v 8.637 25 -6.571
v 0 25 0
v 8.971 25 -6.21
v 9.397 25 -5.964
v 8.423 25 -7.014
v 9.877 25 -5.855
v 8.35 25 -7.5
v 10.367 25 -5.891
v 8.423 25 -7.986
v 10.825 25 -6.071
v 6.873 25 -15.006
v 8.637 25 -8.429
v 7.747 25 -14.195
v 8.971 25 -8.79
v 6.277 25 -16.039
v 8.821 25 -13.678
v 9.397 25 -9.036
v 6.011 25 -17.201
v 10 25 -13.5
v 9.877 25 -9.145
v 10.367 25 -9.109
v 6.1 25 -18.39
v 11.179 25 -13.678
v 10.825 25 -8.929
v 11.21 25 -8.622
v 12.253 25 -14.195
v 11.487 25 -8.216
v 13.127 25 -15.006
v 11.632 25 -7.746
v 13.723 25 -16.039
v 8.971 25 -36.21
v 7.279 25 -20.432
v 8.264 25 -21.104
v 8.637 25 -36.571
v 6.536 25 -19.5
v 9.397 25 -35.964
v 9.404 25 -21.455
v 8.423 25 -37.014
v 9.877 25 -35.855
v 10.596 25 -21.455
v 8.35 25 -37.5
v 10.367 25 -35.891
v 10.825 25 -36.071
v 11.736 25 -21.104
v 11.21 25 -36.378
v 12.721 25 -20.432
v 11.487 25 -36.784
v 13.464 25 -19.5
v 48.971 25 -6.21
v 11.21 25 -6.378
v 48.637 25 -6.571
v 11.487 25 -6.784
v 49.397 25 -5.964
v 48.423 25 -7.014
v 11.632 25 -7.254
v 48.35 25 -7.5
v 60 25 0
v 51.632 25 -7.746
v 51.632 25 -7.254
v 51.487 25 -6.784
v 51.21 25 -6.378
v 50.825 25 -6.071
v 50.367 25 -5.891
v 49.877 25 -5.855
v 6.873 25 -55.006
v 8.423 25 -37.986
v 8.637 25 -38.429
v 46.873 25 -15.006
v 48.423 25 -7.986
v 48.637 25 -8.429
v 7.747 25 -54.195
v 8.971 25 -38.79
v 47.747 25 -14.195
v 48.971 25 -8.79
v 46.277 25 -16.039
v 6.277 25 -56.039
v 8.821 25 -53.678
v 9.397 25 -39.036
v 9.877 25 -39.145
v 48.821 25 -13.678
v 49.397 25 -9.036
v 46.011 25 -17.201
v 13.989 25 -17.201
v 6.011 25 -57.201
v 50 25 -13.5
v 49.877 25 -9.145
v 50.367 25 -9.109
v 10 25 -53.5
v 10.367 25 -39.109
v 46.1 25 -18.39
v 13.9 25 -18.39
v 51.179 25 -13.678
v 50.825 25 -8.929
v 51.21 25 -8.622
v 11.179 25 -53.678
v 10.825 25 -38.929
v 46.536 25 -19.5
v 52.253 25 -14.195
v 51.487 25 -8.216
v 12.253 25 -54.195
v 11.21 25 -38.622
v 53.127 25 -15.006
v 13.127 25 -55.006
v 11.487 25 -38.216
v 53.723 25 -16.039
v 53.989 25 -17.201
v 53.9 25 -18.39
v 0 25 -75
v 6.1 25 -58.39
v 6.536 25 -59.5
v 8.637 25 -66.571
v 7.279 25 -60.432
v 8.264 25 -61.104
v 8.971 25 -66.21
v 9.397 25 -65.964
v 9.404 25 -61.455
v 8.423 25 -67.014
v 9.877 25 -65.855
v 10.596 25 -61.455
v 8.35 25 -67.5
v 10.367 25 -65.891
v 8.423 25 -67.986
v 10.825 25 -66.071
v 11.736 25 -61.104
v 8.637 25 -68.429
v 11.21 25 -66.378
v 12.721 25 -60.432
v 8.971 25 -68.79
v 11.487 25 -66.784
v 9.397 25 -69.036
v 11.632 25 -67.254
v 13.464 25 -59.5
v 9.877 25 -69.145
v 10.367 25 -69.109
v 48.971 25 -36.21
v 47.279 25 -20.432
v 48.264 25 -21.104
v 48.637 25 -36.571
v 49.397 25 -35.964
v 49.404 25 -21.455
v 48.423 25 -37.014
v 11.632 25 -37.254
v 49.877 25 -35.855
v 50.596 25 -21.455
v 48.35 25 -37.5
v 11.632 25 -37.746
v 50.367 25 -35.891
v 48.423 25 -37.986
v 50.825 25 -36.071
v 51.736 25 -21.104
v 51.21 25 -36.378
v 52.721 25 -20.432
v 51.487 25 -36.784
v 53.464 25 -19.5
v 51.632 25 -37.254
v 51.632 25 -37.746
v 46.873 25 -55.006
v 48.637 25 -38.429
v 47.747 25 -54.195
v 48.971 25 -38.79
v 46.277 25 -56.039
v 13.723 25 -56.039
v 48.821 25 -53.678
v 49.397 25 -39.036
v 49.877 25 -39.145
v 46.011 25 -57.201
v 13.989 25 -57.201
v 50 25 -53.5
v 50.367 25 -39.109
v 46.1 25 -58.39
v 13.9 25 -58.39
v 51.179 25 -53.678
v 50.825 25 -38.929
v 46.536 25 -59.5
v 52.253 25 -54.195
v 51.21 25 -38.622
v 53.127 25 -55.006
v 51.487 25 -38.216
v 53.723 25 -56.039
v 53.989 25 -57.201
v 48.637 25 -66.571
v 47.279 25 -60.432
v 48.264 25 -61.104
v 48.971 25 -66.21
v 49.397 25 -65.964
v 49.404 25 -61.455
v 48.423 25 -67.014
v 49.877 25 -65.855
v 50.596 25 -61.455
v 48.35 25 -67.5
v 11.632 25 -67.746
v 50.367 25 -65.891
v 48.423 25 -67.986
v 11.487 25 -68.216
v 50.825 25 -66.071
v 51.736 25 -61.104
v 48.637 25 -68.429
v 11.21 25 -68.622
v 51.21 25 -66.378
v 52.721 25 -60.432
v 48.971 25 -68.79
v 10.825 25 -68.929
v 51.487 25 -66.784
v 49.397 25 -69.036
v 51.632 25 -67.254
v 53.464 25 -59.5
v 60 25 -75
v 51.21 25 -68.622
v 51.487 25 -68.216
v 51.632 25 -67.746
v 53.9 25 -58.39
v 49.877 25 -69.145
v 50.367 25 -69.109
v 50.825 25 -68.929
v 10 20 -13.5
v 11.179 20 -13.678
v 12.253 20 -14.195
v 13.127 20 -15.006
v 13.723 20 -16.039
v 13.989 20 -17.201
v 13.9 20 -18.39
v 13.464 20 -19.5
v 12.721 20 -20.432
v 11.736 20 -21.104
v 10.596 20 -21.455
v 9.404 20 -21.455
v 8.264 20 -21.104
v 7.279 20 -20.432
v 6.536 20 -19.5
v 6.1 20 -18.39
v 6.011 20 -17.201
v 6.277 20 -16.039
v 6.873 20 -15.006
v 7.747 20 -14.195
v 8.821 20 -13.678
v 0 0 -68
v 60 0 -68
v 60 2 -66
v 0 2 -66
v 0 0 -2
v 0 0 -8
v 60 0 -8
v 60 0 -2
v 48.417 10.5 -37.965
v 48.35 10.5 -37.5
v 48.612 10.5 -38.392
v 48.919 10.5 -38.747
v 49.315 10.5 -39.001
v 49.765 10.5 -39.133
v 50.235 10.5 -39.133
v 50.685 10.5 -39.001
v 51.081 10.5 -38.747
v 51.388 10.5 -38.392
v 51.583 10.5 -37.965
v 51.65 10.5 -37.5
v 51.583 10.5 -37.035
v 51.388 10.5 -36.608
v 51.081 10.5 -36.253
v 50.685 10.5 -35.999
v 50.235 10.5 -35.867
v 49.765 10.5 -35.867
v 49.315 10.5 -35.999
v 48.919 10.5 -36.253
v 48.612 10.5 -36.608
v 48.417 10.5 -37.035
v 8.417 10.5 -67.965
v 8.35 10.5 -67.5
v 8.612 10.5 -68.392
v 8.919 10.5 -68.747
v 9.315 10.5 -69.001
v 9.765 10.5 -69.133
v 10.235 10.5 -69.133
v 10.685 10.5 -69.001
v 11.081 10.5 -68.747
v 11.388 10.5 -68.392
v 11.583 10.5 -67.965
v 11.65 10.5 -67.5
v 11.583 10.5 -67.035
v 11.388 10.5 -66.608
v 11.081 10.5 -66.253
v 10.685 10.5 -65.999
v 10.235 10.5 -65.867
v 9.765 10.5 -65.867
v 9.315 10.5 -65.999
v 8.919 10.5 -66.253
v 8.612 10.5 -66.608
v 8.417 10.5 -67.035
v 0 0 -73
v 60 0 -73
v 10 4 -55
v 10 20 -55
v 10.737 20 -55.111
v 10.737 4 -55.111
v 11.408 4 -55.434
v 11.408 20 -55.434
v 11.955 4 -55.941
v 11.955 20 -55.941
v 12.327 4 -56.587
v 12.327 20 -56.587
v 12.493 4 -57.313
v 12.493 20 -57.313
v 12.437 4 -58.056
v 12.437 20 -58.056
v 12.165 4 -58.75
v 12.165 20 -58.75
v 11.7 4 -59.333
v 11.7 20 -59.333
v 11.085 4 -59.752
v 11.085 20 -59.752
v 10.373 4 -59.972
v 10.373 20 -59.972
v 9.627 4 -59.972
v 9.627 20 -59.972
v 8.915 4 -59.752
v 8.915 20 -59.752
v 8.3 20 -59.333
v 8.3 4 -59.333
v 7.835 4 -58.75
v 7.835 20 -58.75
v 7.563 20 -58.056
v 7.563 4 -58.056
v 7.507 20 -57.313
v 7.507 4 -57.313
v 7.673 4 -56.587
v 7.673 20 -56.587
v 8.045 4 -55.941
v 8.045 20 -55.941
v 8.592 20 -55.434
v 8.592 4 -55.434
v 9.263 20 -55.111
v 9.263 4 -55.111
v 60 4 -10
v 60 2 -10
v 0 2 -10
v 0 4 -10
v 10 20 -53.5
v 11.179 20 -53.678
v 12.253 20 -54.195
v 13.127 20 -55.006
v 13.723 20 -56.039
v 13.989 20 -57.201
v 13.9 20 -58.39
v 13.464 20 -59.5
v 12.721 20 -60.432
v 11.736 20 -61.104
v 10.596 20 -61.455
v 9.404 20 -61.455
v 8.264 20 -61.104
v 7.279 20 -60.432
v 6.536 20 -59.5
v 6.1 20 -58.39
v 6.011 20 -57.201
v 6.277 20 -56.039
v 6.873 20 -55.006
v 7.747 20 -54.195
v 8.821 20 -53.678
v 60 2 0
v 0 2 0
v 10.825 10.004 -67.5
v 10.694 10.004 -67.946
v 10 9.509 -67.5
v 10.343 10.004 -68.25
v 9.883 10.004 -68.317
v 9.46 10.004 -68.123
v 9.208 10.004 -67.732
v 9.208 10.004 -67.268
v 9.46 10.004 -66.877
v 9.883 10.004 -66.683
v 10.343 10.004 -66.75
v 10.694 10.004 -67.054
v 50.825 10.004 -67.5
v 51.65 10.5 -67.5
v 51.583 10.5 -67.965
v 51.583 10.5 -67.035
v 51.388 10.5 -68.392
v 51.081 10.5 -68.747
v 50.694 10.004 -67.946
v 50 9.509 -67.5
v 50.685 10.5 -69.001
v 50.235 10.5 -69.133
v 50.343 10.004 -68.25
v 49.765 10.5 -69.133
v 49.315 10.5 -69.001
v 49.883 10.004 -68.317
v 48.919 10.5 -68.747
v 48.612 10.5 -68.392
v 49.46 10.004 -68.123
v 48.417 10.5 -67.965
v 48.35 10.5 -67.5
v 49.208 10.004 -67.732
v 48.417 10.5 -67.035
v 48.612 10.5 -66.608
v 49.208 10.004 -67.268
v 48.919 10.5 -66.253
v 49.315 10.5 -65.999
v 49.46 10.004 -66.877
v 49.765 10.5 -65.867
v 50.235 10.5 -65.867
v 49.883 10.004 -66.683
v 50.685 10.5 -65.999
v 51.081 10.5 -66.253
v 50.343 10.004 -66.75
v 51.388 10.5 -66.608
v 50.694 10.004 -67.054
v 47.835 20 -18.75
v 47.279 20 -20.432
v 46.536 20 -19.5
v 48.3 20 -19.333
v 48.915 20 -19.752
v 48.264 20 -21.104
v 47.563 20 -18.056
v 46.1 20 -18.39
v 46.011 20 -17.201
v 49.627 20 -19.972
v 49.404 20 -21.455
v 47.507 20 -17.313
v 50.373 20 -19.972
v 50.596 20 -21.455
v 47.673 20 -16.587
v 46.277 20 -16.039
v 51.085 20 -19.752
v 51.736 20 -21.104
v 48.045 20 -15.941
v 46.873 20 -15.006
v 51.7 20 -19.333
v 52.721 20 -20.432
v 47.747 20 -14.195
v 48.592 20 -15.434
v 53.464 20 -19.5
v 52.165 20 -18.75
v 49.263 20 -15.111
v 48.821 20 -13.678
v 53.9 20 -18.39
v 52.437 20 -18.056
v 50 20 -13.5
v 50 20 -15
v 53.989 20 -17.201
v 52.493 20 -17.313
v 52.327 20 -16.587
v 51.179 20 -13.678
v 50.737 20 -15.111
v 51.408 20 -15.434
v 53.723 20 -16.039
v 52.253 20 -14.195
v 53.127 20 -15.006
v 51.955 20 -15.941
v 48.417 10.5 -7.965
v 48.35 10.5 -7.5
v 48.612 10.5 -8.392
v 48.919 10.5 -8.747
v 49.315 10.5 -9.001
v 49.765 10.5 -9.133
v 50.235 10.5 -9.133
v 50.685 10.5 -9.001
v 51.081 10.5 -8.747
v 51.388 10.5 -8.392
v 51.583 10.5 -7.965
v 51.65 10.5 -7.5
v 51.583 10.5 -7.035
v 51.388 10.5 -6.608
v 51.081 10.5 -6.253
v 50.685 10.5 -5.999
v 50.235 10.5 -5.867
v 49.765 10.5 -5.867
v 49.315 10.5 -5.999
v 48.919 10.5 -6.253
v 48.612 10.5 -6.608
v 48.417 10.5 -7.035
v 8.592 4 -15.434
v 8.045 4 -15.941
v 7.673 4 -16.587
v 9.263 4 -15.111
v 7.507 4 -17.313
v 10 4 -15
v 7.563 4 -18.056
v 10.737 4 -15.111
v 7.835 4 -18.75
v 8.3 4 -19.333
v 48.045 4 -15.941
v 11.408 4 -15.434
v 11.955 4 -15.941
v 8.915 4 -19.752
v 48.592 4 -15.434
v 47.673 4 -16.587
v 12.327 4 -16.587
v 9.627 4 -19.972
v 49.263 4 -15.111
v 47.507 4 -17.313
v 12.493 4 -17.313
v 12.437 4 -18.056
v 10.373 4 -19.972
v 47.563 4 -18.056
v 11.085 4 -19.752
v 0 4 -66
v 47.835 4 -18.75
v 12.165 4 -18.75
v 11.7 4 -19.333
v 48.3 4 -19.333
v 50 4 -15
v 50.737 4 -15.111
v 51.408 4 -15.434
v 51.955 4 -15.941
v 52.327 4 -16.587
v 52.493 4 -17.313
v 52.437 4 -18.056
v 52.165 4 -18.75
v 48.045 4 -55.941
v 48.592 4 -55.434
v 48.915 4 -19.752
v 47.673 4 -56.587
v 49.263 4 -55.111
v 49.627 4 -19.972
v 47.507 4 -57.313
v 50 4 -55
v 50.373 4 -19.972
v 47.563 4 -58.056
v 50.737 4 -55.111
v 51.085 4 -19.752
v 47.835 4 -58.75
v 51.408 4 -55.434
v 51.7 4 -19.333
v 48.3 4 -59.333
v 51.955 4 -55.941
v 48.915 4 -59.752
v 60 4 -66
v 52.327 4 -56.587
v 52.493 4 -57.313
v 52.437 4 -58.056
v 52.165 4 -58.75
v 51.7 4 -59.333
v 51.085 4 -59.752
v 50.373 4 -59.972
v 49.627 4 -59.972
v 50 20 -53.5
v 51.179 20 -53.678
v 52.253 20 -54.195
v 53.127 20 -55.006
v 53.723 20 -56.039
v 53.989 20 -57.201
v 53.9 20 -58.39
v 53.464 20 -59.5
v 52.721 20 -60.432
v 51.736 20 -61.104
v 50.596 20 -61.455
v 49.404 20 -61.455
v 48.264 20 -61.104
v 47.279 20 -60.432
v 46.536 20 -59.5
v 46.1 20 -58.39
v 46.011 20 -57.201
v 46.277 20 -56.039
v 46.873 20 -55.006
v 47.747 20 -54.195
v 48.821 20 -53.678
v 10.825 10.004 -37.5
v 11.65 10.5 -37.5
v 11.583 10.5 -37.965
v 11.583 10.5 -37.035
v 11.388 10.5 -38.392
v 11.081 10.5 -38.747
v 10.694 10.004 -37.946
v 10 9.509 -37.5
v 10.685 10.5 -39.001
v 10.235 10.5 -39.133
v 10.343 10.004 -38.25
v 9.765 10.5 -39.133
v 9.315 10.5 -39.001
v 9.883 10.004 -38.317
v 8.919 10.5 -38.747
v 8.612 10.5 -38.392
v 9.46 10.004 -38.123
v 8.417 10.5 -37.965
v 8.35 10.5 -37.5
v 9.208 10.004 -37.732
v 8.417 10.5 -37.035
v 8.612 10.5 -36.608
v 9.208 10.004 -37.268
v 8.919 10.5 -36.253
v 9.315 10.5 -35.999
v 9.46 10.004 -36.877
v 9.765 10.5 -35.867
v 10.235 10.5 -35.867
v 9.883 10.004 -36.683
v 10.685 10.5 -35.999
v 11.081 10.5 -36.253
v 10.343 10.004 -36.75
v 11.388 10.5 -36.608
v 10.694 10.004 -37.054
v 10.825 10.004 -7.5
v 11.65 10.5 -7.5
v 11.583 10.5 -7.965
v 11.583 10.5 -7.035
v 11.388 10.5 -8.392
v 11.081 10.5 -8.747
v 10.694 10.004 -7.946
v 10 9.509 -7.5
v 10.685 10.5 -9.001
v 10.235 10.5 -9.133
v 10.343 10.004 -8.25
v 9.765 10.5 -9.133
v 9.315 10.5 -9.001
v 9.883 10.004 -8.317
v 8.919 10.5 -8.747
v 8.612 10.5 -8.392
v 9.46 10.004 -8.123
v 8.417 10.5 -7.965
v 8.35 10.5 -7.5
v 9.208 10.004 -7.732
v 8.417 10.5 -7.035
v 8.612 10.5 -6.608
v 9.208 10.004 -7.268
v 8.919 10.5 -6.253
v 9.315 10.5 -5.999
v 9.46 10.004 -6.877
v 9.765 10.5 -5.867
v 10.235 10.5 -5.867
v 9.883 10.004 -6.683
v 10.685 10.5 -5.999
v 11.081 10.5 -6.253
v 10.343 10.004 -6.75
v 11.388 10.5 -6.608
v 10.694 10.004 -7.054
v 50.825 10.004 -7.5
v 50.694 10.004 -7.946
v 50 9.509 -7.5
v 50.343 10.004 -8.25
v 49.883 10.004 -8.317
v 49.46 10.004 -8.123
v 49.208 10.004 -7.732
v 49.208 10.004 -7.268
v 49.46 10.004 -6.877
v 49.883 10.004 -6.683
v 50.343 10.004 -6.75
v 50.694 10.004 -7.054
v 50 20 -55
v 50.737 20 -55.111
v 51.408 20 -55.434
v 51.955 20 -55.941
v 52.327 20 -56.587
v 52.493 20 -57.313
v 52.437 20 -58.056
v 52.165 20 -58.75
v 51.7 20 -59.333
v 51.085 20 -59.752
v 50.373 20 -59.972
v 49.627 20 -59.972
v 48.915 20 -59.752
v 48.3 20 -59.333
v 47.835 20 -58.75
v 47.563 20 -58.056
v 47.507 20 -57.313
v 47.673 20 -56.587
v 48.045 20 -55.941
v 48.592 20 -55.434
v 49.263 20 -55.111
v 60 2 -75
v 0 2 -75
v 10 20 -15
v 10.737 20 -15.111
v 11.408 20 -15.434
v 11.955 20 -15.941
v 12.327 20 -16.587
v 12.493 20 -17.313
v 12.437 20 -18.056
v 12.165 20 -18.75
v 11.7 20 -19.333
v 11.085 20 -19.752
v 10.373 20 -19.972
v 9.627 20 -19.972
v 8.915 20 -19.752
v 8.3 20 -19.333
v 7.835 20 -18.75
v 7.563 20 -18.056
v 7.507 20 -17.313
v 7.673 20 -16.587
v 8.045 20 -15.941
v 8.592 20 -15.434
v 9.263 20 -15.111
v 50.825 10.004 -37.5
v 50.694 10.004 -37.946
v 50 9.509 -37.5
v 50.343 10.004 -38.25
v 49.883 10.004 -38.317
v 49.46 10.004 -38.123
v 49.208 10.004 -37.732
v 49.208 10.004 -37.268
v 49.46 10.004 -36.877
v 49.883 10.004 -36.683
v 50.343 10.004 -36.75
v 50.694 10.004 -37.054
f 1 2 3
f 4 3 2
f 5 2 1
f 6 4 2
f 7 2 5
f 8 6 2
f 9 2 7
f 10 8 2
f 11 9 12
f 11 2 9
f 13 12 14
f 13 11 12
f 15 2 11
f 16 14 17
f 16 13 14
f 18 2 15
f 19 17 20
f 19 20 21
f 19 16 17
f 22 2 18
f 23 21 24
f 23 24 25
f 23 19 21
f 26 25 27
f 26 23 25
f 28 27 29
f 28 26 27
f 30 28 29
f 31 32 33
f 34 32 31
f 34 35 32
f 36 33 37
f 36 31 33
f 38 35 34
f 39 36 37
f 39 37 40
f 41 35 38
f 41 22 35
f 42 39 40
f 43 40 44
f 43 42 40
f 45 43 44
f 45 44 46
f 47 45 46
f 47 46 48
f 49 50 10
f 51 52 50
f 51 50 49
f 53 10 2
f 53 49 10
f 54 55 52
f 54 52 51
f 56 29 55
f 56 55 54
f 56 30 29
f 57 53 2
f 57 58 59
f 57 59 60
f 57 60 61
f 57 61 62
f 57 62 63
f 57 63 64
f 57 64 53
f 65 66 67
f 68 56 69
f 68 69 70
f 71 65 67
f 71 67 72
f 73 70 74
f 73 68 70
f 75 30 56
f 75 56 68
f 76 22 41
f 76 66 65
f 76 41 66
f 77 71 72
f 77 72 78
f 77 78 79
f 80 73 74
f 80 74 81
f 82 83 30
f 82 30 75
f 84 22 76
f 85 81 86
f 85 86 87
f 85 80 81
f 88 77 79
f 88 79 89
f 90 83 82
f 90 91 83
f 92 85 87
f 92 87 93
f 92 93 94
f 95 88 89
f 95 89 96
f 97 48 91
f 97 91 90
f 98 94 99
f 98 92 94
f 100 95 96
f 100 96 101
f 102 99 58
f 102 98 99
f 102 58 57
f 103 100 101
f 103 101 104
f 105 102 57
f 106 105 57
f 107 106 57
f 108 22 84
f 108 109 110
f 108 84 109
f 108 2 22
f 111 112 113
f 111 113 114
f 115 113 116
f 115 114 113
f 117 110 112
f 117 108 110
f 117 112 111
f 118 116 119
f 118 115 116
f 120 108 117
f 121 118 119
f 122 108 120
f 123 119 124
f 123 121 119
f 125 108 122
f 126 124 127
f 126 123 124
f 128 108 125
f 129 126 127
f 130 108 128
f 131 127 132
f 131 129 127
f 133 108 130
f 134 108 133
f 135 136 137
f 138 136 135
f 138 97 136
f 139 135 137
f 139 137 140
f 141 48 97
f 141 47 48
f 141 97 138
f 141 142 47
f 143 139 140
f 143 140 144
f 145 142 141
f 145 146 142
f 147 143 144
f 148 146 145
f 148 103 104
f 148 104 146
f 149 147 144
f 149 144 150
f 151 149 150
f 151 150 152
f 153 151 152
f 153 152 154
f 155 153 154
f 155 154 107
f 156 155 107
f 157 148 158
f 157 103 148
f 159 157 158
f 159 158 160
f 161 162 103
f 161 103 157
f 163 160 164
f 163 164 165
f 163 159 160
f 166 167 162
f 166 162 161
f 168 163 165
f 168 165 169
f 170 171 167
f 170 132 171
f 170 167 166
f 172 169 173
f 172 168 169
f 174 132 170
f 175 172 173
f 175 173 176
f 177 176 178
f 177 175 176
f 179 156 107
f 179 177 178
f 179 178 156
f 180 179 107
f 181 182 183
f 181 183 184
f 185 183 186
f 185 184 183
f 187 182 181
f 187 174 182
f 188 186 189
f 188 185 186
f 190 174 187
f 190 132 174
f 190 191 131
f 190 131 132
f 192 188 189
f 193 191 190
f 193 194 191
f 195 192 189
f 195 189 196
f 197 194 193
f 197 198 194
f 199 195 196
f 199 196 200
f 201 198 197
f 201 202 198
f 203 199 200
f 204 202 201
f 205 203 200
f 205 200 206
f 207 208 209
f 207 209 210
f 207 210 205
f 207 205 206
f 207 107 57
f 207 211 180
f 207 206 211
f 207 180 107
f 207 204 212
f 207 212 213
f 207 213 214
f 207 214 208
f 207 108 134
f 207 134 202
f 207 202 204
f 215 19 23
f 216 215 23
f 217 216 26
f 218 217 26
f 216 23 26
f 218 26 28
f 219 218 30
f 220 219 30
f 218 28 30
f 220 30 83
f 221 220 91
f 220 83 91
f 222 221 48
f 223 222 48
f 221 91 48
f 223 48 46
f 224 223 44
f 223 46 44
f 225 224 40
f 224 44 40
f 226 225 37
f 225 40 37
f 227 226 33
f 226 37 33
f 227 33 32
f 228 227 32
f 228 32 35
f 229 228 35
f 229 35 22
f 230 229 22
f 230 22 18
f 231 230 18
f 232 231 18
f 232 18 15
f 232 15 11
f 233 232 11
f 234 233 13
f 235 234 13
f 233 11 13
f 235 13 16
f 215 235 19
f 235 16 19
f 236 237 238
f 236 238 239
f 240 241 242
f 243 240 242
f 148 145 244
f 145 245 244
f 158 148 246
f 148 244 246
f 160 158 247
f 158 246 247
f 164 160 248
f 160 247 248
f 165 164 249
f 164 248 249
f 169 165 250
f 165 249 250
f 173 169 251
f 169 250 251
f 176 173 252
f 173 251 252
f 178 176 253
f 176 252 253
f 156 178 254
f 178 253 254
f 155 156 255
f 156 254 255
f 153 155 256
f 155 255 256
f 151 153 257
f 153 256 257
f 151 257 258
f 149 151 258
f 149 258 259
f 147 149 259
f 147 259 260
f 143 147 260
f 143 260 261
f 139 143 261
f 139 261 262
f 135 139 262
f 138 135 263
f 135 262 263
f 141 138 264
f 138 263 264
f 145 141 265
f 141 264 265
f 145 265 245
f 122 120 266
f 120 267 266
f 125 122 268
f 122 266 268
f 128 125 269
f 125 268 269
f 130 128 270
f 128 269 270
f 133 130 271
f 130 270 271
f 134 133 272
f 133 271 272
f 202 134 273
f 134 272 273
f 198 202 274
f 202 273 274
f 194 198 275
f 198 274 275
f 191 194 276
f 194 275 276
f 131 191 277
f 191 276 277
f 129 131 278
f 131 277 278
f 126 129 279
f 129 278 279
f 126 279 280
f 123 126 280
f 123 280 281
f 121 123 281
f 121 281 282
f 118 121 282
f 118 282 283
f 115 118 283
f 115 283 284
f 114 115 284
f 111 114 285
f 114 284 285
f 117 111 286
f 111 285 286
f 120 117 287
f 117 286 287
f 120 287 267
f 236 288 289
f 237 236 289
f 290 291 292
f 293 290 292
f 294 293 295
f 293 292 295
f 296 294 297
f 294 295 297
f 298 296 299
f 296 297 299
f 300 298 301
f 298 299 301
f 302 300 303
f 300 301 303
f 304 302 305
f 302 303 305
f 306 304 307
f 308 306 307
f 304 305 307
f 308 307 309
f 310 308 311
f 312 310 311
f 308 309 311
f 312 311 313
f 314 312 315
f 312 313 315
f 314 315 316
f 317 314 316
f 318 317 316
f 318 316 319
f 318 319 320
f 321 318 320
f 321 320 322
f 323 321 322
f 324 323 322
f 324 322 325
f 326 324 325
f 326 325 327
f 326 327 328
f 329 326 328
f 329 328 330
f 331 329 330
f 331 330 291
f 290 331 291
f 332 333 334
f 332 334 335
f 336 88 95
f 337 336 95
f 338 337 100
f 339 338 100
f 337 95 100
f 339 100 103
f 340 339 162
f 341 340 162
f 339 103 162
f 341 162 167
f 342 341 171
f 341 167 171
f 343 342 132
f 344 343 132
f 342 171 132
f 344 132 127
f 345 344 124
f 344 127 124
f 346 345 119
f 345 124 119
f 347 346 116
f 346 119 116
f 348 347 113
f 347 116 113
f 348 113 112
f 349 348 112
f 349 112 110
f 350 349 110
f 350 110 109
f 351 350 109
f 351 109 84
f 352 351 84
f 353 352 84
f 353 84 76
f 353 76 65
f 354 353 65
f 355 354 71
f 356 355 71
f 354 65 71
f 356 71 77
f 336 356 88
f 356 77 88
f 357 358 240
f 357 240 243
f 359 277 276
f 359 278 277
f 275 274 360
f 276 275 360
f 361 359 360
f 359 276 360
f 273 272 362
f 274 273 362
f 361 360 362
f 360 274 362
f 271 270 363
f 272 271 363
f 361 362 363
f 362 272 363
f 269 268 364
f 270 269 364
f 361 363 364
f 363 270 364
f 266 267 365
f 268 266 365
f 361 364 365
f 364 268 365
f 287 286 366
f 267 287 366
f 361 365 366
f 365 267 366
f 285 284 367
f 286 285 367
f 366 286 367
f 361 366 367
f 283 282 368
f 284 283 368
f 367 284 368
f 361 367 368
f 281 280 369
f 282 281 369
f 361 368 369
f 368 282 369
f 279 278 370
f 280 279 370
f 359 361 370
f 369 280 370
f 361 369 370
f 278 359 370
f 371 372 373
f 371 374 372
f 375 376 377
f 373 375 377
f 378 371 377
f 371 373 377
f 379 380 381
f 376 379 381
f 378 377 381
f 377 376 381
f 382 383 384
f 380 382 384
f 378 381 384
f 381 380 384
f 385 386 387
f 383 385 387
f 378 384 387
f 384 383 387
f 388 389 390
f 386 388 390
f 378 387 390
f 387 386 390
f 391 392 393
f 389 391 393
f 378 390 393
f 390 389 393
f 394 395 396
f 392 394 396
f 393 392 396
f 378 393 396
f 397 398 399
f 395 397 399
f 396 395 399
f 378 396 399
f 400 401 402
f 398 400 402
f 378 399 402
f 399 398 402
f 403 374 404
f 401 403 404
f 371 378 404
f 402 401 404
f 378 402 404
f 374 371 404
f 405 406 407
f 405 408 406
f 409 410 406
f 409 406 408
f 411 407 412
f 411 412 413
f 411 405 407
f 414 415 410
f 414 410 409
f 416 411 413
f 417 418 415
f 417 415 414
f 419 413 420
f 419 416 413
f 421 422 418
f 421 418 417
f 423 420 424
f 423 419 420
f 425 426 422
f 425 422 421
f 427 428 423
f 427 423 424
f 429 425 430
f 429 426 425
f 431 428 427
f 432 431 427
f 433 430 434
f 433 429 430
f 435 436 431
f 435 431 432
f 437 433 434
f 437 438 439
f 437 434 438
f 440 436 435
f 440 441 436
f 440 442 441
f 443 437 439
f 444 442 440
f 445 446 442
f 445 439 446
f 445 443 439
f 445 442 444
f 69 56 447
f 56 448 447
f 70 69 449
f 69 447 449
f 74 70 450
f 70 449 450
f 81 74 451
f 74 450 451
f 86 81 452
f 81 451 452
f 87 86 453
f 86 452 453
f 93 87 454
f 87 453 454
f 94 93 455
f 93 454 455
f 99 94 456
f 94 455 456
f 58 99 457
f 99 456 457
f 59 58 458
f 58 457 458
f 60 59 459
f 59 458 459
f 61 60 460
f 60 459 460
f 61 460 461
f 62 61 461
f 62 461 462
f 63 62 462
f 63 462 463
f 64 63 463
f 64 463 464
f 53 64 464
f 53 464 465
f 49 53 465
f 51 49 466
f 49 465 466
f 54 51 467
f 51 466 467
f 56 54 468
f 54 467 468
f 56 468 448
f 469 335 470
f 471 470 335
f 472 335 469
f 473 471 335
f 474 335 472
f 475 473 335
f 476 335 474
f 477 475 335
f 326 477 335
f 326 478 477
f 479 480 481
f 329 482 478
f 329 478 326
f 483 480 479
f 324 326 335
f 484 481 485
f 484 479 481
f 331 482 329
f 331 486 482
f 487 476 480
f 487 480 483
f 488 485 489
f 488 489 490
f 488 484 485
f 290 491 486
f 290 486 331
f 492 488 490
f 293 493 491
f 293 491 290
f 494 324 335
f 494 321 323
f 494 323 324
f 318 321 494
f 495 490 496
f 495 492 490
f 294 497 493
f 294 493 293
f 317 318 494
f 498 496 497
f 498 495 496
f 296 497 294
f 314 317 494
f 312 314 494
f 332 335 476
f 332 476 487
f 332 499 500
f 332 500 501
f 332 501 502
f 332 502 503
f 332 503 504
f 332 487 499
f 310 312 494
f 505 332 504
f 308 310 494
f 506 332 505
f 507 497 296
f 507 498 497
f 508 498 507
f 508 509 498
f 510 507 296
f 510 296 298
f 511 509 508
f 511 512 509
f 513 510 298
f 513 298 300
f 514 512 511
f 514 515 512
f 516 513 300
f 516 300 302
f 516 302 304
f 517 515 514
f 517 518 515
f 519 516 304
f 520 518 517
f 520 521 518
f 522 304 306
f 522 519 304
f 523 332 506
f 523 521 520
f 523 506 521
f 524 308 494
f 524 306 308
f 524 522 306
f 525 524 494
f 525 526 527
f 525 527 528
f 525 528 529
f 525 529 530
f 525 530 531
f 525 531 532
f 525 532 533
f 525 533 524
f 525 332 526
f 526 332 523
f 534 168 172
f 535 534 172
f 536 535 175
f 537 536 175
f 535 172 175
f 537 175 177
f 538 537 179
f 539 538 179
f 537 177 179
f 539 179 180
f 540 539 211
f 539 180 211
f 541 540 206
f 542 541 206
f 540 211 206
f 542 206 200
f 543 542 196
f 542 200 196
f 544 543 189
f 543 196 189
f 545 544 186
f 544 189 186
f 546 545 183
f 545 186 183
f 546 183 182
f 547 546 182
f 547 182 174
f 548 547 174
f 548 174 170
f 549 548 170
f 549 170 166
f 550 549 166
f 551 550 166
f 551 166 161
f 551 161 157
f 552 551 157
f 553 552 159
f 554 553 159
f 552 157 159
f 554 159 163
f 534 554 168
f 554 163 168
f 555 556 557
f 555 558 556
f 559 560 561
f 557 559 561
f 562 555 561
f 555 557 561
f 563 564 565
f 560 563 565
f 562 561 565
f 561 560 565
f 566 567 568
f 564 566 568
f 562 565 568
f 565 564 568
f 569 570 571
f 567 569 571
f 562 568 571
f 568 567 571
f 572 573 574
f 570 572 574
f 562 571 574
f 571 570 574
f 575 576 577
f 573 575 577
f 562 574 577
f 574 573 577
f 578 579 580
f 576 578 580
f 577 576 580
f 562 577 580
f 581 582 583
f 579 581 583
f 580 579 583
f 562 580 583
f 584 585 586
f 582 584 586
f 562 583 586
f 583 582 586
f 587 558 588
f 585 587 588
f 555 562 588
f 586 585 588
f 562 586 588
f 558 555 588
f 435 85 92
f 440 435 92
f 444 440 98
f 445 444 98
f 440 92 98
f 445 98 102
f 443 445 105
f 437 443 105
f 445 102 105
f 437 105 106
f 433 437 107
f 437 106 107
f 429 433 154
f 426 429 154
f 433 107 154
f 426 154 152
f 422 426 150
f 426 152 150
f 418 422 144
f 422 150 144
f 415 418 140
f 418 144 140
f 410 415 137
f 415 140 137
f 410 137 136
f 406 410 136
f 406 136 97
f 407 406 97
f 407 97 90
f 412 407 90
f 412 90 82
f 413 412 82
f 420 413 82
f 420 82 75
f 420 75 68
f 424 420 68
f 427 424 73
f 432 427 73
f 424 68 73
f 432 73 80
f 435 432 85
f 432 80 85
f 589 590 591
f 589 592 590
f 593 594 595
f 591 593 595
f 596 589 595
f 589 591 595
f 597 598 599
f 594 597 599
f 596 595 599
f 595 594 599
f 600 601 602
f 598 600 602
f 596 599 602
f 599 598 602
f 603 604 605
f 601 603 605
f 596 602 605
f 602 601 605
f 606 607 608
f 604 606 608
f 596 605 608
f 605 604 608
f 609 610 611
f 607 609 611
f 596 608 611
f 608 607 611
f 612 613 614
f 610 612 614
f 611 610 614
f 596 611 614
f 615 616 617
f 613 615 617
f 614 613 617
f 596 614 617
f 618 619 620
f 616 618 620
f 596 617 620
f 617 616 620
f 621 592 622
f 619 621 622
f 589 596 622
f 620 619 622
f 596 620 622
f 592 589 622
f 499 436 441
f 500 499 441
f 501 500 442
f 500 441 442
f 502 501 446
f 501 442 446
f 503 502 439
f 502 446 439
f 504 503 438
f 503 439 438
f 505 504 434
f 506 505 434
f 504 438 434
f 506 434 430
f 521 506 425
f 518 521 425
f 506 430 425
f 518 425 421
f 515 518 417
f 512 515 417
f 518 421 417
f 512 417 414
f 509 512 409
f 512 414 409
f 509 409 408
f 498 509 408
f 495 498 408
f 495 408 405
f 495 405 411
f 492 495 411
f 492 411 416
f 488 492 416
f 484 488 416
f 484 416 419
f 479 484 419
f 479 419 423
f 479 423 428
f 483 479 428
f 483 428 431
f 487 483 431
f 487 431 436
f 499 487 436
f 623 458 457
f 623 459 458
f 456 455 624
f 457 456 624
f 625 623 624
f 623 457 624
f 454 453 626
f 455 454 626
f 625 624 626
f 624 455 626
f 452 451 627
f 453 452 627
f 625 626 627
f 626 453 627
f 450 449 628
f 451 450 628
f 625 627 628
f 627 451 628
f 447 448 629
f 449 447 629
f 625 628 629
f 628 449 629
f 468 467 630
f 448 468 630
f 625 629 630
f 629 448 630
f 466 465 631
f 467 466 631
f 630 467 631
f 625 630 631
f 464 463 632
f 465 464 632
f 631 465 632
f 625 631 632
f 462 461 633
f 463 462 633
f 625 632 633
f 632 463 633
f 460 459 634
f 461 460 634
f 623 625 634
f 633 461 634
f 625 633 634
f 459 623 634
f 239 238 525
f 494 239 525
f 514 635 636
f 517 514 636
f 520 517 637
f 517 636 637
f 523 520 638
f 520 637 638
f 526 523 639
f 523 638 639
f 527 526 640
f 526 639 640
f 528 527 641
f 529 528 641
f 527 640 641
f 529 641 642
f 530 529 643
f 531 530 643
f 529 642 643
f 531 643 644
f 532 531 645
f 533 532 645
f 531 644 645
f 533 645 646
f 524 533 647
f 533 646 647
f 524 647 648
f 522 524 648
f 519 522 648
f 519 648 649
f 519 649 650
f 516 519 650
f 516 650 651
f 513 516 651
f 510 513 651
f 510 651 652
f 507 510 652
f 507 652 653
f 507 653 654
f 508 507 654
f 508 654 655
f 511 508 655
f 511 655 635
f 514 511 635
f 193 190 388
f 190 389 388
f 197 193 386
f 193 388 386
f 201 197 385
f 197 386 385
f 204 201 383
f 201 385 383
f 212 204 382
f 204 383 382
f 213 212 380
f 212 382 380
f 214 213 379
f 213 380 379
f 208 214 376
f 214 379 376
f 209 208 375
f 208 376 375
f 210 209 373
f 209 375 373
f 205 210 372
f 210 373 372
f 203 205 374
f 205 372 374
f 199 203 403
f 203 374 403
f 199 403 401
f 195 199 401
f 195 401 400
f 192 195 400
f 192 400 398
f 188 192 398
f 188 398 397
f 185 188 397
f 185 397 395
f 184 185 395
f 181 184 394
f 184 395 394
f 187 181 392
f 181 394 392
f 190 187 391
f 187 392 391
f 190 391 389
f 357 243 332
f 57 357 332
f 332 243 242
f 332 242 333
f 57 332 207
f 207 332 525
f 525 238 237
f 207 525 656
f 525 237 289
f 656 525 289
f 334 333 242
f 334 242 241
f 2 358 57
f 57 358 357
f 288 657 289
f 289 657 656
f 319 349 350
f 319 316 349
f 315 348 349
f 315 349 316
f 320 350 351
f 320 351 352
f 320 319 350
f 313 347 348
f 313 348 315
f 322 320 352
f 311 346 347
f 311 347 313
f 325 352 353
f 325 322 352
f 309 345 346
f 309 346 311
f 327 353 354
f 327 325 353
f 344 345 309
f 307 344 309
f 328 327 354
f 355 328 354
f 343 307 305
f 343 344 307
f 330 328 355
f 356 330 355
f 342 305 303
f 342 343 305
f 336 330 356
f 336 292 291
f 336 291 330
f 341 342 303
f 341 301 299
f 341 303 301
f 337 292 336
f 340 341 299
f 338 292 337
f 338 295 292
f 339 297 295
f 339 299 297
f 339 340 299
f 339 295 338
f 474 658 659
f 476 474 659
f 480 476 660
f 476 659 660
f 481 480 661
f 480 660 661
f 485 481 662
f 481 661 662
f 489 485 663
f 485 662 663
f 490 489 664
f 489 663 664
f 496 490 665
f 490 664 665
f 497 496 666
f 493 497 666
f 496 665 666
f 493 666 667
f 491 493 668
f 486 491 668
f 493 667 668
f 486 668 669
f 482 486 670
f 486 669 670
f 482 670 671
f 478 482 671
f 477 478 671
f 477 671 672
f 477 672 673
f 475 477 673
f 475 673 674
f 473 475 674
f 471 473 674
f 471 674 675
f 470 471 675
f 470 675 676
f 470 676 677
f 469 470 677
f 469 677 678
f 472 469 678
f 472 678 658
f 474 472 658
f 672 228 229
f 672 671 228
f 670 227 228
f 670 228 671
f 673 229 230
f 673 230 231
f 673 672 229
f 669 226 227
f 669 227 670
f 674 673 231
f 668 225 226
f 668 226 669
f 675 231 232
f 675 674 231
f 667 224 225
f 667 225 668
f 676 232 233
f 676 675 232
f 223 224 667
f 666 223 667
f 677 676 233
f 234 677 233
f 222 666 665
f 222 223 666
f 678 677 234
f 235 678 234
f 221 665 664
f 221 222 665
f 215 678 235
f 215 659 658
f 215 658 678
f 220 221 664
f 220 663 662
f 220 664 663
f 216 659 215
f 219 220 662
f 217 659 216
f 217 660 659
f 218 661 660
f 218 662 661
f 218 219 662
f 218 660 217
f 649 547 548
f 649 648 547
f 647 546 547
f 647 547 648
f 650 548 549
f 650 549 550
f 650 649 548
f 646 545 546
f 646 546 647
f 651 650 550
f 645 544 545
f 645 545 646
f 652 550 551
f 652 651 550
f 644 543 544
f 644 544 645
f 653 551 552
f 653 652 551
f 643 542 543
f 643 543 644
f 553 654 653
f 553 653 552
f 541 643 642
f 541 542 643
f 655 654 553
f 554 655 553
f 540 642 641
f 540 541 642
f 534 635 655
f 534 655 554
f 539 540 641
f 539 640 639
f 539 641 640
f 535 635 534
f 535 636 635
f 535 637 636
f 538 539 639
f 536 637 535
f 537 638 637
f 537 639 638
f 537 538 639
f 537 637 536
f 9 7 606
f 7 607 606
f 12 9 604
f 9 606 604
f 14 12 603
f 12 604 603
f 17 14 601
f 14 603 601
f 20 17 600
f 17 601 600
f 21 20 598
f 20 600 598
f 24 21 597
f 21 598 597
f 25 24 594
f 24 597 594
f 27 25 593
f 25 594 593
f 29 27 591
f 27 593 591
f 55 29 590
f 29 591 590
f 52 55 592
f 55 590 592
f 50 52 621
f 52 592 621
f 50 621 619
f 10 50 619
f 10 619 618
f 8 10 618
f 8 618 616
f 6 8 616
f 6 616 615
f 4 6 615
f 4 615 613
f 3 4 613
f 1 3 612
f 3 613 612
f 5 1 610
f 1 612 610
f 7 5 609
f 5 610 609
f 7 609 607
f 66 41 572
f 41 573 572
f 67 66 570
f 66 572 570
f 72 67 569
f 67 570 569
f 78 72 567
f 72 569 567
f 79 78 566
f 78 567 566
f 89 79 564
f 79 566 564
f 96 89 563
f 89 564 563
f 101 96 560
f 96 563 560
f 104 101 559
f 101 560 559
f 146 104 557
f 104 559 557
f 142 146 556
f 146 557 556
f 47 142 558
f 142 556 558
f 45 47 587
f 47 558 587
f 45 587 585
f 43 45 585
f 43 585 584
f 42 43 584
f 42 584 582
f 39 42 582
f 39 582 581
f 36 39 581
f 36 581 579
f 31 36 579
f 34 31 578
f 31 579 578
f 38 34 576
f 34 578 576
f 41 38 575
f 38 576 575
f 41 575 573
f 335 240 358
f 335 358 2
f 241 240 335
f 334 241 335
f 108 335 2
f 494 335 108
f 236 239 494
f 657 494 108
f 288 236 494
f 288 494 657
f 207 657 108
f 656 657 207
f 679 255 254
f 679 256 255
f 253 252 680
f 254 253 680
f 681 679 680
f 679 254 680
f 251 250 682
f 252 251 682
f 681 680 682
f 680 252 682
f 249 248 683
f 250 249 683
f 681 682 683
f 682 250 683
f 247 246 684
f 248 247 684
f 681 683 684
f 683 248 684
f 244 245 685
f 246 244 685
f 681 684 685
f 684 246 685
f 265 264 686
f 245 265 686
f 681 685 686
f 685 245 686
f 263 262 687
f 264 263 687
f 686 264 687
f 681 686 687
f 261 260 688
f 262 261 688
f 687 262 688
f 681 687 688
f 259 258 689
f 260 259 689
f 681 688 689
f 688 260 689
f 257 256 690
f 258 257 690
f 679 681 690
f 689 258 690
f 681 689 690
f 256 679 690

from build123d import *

# Parameters (mm, degrees)
SKETCH_1_W             = 60
SKETCH_1_H             = 75
EXTRUDE_1_DEPTH        = 25
SKETCH_2_W             = 56
SKETCH_2_H             = 4
CUT_EXTRUDE_1_DEPTH    = 100.247166206
CHAMFER_1_SIZE         = 2
SKETCH_3_R             = 4
CUT_EXTRUDE_2_DEPTH    = 5
SKETCH_4_R             = 2.5
CUT_EXTRUDE_3_DEPTH    = 99.107084352
HOLE_WIZARD_M4_1_D     = 3.3
HOLE_WIZARD_M4_1_DEPTH = 14.5
HOLE_WIZARD_M4_1_TIP   = 0.991420021


with BuildPart() as part:
    # 스케치1 → 보스-돌출1 (new body)
    with BuildSketch(Plane(origin=(0, 0, 0), x_dir=(1, 0, 0), z_dir=(0, 1, 0))):
        with Locations((30, 37.5)):
            Rectangle(SKETCH_1_W, SKETCH_1_H)
    extrude(amount=EXTRUDE_1_DEPTH)

    # 스케치2 → 컷-돌출1 (cut, through all)
    with BuildSketch(Plane(origin=(60, 0, 0), x_dir=(0, 0, -1), z_dir=(1, 0, 0))):
        with Locations((38, 2)):
            Rectangle(SKETCH_2_W, SKETCH_2_H)
    extrude(amount=-CUT_EXTRUDE_1_DEPTH, mode=Mode.SUBTRACT)

    # 모따기1
    chamfer_1_edges = [part.edges().sort_by_distance(p)[0] for p in [
        (30, 0, -10),
        (30, 0, -66),
        (30, 0, -75),
        (30, 0, 0),
    ]]
    chamfer(chamfer_1_edges, length=CHAMFER_1_SIZE)

    # 스케치3 → 컷-돌출2 (cut)
    with BuildSketch(Plane(origin=(0, 25, 0), x_dir=(1, 0, 0), z_dir=(0, 1, 0))):
        with Locations(Location((10, 57.5, 0), (0, 0, 270))):
            Circle(SKETCH_3_R)
        with Locations(Location((10, 17.5, 0), (0, 0, 270))):
            Circle(SKETCH_3_R)
        with Locations(Location((50, 57.5, 0), (0, 0, 270))):
            Circle(SKETCH_3_R)
        with Locations(Location((50, 17.5, 0), (0, 0, 270))):
            Circle(SKETCH_3_R)
    extrude(amount=-CUT_EXTRUDE_2_DEPTH, mode=Mode.SUBTRACT)

    # 스케치4 → 컷-돌출3 (cut, through all)
    with BuildSketch(Plane(origin=(0, 20, 0), x_dir=(1, 0, 0), z_dir=(0, 1, 0))):
        with Locations(Location((10, 57.5, 0), (0, 0, 270))):
            Circle(SKETCH_4_R)
        with Locations(Location((50, 57.5, 0), (0, 0, 270))):
            Circle(SKETCH_4_R)
        with Locations(Location((50, 17.5, 0), (0, 0, 270))):
            Circle(SKETCH_4_R)
        with Locations(Location((10, 17.5, 0), (0, 0, 270))):
            Circle(SKETCH_4_R)
    extrude(amount=-CUT_EXTRUDE_3_DEPTH, mode=Mode.SUBTRACT)

    # M4 나사 구멍1
    with Locations(Plane(origin=(0, 25, 0), x_dir=(1, 0, 0), z_dir=(0, 1, 0))):
        with Locations((10, 67.5), (10, 37.5), (10, 7.5), (50, 67.5), (50, 37.5), (50, 7.5)):
            Hole(HOLE_WIZARD_M4_1_D / 2, depth=HOLE_WIZARD_M4_1_DEPTH)
            with Locations((0, 0, -(HOLE_WIZARD_M4_1_DEPTH + HOLE_WIZARD_M4_1_TIP / 2))):  # 118° drill point
                Cone(0, HOLE_WIZARD_M4_1_D / 2, HOLE_WIZARD_M4_1_TIP, mode=Mode.SUBTRACT)


solid = part.part
